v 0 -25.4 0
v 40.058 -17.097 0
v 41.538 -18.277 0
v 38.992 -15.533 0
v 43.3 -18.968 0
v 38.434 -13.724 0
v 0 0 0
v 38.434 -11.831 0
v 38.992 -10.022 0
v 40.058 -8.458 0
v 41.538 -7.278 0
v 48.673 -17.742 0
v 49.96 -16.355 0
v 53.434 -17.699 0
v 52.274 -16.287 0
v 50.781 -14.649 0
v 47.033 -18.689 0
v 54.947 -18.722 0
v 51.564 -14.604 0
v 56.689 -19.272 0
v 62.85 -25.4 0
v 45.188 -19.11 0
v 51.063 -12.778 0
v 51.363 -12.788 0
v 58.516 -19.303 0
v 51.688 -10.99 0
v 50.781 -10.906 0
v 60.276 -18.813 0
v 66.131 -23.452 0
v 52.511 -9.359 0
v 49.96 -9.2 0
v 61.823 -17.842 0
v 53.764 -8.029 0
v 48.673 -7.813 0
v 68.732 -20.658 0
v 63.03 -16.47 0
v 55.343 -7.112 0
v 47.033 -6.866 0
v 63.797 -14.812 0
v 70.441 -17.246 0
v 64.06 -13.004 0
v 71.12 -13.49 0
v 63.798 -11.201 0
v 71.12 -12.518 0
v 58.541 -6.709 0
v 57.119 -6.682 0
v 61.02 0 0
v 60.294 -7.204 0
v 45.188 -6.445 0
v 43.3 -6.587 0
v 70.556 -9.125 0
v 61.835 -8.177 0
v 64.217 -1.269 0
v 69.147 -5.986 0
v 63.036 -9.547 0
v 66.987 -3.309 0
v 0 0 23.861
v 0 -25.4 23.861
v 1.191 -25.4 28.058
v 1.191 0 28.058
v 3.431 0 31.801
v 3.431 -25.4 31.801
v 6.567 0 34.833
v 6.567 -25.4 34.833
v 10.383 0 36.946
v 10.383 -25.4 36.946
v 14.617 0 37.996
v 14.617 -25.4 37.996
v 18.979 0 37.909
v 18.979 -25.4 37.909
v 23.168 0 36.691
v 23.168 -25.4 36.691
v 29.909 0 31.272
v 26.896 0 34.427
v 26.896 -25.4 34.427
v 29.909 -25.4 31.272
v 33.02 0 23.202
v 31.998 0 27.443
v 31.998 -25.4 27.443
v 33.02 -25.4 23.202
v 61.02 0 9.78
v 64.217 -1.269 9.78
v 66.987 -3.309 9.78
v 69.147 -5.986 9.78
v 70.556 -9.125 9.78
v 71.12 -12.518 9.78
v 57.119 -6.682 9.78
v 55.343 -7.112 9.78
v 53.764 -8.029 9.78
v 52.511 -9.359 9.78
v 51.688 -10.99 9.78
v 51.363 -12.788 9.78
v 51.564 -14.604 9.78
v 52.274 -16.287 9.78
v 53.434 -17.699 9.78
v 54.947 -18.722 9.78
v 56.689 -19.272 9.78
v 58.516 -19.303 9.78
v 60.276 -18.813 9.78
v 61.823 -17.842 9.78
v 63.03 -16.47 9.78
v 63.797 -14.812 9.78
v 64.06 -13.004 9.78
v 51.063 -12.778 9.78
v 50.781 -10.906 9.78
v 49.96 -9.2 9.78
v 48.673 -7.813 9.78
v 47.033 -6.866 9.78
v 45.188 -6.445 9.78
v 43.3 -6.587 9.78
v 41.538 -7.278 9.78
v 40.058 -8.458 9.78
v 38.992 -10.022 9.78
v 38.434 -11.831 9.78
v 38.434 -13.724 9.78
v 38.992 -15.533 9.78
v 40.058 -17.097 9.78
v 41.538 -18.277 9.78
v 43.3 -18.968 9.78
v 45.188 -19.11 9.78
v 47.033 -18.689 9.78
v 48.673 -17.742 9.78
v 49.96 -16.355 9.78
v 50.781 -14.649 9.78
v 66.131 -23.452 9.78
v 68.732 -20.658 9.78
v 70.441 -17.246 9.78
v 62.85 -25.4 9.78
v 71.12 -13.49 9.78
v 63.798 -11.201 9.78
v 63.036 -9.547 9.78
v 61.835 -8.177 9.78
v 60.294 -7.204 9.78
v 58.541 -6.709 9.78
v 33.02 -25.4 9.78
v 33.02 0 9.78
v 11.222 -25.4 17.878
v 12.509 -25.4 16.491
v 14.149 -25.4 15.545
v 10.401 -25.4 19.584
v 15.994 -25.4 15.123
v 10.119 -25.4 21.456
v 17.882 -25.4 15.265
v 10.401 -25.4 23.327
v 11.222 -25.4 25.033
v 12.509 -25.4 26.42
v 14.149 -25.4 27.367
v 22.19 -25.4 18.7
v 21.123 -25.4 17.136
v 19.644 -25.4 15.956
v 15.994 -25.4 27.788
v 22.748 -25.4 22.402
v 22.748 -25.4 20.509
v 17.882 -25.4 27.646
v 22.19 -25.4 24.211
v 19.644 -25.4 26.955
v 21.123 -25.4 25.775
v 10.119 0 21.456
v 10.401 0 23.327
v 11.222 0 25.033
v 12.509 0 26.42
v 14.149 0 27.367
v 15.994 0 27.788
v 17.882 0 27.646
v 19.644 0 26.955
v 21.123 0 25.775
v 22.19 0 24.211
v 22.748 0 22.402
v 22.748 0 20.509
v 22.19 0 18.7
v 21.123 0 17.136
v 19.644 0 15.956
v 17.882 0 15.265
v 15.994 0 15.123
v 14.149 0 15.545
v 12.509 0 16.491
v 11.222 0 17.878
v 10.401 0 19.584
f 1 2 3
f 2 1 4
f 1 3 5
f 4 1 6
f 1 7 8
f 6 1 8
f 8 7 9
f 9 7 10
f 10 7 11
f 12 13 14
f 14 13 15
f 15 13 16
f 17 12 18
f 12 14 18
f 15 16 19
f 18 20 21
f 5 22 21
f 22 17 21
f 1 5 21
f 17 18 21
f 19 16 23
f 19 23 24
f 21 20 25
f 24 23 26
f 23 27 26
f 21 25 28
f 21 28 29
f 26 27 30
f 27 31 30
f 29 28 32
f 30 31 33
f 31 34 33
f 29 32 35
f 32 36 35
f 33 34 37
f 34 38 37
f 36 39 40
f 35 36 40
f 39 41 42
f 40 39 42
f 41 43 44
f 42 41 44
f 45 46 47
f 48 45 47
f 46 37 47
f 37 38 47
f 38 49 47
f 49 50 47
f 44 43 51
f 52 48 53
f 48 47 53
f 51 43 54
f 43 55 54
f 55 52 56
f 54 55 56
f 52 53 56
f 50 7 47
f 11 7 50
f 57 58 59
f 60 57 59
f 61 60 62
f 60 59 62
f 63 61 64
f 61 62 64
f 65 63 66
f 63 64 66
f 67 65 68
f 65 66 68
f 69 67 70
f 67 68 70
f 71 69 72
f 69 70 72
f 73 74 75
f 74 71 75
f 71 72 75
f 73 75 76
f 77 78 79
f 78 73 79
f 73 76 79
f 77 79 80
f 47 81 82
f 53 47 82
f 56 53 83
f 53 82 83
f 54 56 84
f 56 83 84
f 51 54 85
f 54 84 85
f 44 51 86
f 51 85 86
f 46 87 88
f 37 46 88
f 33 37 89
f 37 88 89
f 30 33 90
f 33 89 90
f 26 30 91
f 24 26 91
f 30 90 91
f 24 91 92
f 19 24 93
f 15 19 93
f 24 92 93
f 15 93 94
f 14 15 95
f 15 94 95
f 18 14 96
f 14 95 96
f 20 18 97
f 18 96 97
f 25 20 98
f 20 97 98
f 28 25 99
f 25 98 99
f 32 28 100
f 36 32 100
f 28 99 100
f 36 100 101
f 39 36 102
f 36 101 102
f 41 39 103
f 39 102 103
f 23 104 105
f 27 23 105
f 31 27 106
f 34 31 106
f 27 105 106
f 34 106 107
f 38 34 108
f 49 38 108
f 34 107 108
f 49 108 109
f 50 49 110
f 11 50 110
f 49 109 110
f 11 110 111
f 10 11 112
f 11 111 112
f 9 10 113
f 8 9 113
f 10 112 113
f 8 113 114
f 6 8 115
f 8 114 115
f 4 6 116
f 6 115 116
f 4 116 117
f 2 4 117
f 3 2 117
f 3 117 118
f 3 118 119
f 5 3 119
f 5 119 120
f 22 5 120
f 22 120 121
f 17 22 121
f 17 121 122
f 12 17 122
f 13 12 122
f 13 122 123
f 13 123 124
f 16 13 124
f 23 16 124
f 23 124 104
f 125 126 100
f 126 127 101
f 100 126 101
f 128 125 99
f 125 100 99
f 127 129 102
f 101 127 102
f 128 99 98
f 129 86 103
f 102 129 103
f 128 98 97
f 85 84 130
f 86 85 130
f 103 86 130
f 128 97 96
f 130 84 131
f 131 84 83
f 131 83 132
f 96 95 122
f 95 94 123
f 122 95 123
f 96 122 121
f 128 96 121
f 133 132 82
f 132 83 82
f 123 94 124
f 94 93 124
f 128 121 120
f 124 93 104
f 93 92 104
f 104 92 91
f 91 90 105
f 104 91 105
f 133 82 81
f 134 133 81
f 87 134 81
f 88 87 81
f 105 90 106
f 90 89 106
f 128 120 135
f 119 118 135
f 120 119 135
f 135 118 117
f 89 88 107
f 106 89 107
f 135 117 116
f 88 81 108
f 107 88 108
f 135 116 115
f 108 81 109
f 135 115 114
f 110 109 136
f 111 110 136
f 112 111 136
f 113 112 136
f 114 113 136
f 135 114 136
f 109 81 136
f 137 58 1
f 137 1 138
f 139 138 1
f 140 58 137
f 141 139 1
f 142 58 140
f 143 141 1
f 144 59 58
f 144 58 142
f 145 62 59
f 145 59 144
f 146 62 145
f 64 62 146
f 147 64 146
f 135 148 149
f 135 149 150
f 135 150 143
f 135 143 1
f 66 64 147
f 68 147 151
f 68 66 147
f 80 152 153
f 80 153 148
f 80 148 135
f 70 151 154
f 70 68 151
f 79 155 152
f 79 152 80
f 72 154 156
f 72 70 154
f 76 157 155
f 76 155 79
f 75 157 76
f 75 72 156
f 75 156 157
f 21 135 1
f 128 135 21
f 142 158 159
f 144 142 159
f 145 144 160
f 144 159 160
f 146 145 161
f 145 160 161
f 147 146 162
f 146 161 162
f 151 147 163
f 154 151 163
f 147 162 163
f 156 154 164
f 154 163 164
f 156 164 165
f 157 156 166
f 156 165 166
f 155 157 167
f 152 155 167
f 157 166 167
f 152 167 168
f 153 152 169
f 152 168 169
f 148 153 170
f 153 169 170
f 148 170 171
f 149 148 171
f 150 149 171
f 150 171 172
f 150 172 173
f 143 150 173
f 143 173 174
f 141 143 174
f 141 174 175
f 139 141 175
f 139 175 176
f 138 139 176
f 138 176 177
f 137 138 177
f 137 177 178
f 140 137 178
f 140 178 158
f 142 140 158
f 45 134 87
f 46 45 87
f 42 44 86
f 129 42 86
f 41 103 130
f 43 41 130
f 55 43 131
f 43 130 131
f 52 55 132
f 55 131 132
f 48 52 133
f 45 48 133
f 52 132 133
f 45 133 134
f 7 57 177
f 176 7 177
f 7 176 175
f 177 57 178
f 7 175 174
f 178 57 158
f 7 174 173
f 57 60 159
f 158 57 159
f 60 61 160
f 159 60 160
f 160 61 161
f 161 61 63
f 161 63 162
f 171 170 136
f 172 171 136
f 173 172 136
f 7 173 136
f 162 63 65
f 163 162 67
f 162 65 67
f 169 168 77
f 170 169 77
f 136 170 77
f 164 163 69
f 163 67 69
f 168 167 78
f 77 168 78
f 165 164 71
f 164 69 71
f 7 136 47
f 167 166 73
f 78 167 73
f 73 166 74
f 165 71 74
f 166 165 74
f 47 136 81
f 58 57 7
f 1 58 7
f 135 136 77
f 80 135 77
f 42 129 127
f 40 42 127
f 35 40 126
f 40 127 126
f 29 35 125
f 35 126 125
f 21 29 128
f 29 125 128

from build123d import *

# Parameters (mm, degrees)
F1_DEPTH  = 25.4
F3_DEPTH  = 25.401
F5_DEPTH  = 9.780613
F6_R      = 6.35
F7_DEPTH  = 25.401
F8_R      = 6.35
F11_DEPTH = 9.780613


with BuildPart() as f1:
    # F0 (on Front) → F1 (new body)
    with BuildSketch(Plane.XZ):
        Polygon((0, 38.1), (0, 0), (71.12, 0), (71.12, 9.779613), (33.02, 9.779613), (33.02, 38.1), align=None)
    extrude(amount=F1_DEPTH)

    # F2 (on face) → F3 (cut, through all)
    with BuildSketch(Plane.XZ.offset(25.4)):
        with BuildLine():
            ThreePointArc((0, 23.861155), (16.80079, 38.095578), (33.02, 23.20187))
            Line((33.02, 23.20187), (33.02, 38.1))
            Line((33.02, 38.1), (0, 38.1))
            Line((0, 38.1), (0, 23.861155))
        make_face()
    extrude(amount=-F3_DEPTH, mode=Mode.SUBTRACT)

    # F4 (on face) → F5 (cut, through all)
    with BuildSketch(Plane.XY.offset(9.779613)):
        with BuildLine():
            ThreePointArc((61.019834, 0), (68.153419, -4.578181), (71.12, -12.518407))
            Line((71.12, -12.518407), (71.12, 0))
            Line((71.12, 0), (61.019834, 0))
        make_face()
        with BuildLine():
            ThreePointArc((71.12, -13.490307), (68.731865, -20.658356), (62.849611, -25.4))
            Line((62.849611, -25.4), (71.12, -25.4))
            Line((71.12, -25.4), (71.12, -13.490307))
        make_face()
    extrude(amount=-F5_DEPTH, mode=Mode.SUBTRACT)

    # F6 (on face) → F7 (cut, through all)
    with BuildSketch(Plane(origin=(0, 0, 0), x_dir=(-1, 0, 0), z_dir=(0, 1, 0))):
        with Locations((-16.468551, 21.455578)):
            Circle(F6_R)
    extrude(amount=-F7_DEPTH, mode=Mode.SUBTRACT)

    # F10 (on face) + F8 (on face) → F11 (cut, through all)
    with BuildSketch(Plane.XY.offset(9.779613)):
        with BuildLine():
            Line((58.540852, -6.708974), (57.118951, -6.681905))
            ThreePointArc((57.118951, -6.681905), (53.433667, -17.698736), (64.059799, -13.004357))
            ThreePointArc((64.059799, -13.004357), (62.484717, -8.81835), (58.540852, -6.708974))
        make_face()
    with BuildSketch(Plane.XY.offset(9.779613)):
        with Locations((44.713352, -12.77754)):
            Circle(F8_R)
    extrude(amount=-F11_DEPTH, mode=Mode.SUBTRACT)


solid = f1.part
